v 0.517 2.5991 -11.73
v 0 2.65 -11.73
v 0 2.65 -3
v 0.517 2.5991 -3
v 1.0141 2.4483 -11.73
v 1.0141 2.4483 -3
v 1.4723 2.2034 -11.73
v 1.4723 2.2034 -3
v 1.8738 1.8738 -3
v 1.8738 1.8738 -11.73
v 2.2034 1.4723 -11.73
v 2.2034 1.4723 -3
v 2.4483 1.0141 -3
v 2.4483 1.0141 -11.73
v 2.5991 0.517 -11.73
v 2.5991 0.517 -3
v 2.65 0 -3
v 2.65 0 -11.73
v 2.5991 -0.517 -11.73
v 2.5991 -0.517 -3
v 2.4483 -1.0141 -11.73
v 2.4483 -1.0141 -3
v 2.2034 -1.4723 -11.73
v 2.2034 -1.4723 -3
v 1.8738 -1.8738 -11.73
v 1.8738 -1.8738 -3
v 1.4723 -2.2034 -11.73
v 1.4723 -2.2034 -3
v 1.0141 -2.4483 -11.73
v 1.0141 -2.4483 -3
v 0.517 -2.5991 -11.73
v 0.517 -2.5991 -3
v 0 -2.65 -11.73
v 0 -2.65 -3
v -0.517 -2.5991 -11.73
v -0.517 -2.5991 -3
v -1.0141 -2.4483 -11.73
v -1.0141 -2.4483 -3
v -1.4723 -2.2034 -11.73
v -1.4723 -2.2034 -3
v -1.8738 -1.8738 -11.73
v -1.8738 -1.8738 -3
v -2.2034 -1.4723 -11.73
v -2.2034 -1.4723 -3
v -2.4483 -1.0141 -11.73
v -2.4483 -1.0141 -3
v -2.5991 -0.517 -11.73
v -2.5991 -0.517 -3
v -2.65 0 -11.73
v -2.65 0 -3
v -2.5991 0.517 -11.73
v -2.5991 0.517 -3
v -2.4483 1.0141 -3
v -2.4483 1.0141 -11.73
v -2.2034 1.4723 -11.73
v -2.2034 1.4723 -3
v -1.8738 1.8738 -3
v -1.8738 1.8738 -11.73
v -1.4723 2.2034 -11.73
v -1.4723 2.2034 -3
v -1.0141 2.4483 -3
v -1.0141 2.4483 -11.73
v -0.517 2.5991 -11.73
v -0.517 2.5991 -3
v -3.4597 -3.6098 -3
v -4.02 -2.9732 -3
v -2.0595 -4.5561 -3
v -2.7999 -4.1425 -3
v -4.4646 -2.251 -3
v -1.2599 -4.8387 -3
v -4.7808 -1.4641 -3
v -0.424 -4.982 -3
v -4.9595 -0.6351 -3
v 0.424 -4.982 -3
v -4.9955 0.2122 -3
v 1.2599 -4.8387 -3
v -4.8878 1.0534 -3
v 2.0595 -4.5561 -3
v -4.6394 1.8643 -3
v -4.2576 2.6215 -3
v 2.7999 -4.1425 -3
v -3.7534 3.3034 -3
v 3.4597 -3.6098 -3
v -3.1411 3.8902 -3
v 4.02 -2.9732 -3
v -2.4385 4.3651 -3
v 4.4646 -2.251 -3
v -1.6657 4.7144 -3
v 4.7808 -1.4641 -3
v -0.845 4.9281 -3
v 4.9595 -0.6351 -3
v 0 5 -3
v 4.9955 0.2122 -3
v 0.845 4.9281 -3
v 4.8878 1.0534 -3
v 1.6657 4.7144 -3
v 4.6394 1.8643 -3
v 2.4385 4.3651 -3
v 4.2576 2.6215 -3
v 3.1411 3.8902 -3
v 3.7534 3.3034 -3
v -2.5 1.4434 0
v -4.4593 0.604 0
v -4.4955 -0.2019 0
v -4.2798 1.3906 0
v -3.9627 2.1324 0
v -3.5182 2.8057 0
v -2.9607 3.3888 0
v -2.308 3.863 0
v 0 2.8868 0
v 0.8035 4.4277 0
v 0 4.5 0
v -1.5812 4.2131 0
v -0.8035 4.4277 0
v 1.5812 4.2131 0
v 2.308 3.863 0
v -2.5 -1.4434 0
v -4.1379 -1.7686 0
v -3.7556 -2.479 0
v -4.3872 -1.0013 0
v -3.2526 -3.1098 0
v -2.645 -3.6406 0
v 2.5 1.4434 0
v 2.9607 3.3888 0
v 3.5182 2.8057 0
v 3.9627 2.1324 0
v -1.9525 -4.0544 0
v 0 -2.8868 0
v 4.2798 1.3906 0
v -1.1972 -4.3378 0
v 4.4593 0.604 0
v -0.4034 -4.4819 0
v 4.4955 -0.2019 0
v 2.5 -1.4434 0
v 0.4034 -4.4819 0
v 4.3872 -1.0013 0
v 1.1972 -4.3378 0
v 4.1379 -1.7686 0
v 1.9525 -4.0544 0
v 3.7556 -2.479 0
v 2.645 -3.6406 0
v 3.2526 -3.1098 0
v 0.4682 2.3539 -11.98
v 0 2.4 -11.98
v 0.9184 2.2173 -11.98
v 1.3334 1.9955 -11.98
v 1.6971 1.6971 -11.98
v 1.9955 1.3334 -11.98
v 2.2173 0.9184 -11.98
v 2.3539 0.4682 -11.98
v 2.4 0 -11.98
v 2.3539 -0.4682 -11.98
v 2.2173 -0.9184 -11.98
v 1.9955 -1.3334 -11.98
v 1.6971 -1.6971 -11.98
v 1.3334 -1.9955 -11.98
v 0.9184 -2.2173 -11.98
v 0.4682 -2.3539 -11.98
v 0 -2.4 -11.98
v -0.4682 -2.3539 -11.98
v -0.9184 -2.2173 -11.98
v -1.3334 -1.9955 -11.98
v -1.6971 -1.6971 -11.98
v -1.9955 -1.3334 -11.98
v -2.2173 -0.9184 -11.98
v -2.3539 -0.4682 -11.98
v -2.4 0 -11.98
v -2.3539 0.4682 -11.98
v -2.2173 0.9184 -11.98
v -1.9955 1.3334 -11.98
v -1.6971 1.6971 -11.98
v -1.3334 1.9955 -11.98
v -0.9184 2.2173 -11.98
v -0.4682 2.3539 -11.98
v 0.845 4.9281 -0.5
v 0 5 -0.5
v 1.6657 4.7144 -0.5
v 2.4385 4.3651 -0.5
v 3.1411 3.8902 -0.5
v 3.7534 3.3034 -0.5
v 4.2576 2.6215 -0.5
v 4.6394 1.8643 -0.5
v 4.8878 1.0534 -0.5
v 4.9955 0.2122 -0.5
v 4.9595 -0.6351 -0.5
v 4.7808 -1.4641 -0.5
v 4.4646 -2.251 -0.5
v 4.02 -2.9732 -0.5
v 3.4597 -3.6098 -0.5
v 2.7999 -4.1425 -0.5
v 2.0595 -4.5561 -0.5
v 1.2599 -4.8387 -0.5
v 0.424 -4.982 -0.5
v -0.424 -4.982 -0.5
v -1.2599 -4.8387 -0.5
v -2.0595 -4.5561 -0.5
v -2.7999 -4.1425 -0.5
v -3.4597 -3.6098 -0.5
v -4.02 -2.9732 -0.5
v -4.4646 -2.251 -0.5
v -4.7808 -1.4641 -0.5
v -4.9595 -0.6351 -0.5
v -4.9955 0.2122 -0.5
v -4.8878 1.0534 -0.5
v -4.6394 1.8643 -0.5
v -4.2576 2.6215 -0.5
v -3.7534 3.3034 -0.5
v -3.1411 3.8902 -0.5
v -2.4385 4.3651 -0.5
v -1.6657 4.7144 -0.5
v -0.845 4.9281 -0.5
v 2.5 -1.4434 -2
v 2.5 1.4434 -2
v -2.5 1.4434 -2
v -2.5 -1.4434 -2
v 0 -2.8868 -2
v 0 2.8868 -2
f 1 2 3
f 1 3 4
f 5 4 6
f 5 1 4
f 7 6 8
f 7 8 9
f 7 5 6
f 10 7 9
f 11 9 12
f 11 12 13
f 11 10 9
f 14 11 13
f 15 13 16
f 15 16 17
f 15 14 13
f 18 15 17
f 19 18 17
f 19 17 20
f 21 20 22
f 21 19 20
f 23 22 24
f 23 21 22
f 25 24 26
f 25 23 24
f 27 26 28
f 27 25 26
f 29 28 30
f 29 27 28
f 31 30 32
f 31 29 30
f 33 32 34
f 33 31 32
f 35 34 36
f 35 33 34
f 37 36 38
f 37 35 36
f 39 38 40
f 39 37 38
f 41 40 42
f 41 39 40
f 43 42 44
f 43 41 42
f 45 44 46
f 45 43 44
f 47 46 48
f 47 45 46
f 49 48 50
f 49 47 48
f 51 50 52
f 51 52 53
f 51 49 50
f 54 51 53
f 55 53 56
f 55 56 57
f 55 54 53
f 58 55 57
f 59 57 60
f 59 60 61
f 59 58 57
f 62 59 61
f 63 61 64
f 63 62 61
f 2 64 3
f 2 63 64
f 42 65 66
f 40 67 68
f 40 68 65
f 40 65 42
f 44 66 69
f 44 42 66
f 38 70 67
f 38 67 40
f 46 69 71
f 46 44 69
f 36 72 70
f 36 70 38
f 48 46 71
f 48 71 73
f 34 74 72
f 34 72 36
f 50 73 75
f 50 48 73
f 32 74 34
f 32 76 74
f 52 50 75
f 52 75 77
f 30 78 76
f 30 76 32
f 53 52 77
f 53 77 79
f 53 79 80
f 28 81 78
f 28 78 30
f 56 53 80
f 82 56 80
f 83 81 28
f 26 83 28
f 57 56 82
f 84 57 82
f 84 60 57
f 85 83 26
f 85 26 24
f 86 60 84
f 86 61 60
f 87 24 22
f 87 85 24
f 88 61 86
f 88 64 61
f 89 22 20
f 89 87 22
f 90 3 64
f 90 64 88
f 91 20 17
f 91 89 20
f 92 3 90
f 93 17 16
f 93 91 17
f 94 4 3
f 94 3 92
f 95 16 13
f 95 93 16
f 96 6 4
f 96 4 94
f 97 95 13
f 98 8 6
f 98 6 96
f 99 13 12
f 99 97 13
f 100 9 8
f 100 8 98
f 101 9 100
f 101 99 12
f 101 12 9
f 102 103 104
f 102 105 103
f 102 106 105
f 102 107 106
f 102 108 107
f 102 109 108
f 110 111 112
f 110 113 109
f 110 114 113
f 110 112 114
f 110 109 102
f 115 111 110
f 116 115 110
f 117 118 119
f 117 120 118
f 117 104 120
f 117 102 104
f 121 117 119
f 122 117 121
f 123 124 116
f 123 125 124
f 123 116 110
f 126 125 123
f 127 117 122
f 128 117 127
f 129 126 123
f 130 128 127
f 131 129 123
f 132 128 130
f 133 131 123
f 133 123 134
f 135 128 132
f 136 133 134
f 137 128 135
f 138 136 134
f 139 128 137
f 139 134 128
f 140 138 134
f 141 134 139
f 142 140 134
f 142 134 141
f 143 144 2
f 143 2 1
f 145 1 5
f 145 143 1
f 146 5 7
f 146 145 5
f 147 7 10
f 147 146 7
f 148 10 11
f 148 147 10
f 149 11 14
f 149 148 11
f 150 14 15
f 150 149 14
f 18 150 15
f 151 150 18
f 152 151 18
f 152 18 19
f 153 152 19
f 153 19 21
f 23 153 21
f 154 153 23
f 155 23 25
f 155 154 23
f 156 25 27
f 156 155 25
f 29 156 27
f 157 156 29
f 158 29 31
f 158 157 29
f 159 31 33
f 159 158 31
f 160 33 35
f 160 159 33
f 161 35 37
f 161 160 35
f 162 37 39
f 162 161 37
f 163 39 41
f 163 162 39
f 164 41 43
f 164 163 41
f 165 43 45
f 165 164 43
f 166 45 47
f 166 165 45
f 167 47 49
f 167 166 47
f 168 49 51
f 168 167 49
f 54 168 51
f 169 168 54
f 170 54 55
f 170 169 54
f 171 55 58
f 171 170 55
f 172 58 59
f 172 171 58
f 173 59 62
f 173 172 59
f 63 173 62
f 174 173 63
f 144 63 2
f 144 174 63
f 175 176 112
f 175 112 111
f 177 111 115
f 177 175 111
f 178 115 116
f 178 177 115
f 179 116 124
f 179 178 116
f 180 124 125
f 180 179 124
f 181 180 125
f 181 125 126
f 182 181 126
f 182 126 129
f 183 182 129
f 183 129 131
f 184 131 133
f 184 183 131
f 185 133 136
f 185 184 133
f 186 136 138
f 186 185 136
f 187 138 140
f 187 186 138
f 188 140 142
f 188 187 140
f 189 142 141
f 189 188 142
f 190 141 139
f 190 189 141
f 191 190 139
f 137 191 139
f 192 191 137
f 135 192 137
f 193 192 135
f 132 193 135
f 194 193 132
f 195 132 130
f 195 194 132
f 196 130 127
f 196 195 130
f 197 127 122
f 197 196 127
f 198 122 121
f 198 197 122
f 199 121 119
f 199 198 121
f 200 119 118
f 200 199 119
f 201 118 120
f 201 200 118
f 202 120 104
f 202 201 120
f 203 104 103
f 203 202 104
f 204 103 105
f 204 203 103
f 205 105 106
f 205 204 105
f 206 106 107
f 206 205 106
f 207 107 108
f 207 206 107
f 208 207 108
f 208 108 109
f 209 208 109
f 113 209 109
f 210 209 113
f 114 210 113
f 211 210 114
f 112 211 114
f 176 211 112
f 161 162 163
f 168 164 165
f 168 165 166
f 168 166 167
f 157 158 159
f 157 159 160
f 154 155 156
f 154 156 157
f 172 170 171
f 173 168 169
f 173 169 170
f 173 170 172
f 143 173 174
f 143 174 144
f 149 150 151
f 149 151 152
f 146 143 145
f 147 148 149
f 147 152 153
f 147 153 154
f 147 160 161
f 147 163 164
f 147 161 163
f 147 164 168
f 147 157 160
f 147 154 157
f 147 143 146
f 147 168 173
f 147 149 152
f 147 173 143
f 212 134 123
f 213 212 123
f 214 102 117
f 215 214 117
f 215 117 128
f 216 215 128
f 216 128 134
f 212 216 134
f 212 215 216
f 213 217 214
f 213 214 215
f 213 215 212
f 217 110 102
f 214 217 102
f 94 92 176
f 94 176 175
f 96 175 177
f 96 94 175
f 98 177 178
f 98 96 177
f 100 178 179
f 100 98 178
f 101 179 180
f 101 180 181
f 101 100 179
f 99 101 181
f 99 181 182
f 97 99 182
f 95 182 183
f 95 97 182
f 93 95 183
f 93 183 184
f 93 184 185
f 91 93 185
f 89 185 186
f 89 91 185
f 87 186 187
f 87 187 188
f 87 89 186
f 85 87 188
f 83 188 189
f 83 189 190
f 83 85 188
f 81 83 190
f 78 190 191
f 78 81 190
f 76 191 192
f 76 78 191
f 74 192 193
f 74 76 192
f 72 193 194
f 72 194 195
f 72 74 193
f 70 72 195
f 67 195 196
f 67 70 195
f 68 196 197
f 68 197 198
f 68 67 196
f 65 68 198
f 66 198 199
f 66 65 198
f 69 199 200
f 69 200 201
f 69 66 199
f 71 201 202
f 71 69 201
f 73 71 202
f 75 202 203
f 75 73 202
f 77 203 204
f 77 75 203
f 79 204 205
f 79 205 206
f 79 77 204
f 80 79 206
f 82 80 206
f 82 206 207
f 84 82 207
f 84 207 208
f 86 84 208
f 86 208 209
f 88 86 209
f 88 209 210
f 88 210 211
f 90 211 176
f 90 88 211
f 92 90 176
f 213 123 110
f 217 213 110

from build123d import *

# Parameters (mm, degrees)
CUT_EXTRUDE2_DEPTH = 2
CHAMFER1_SIZE      = 0.5
CHAMFER2_SIZE      = 0.25


with BuildPart() as part:
    # Sketch1 → Revolve1 (revolve)
    with BuildSketch(Plane(origin=(0, 0, 0), x_dir=(0, 0, -1), z_dir=(1, 0, 0))):
        Polygon((0, 0), (0, 5), (3, 5), (3, 2.65), (11.98, 2.65), (11.98, 0), align=None)
    revolve(axis=Axis((0, 0, 0), (0, 0, -1)))

    # Sketch2 → Cut-Extrude2 (cut)
    with BuildSketch(Plane.XY):
        Polygon((0, 2.886751346), (-2.5, 1.443375673), (-2.5, -1.443375673), (0, -2.886751346), (2.5, -1.443375673), (2.5, 1.443375673), align=None)
    extrude(amount=-CUT_EXTRUDE2_DEPTH, mode=Mode.SUBTRACT)

    # Chamfer1
    chamfer1_edges = [part.edges().sort_by_distance(p)[0] for p in [
        (0, -5, 0),
    ]]
    chamfer(chamfer1_edges, length=CHAMFER1_SIZE)

    # Chamfer2
    chamfer2_edges = [part.edges().sort_by_distance(p)[0] for p in [
        (0, -2.65, -11.98),
    ]]
    chamfer(chamfer2_edges, length=CHAMFER2_SIZE)


solid = part.part
